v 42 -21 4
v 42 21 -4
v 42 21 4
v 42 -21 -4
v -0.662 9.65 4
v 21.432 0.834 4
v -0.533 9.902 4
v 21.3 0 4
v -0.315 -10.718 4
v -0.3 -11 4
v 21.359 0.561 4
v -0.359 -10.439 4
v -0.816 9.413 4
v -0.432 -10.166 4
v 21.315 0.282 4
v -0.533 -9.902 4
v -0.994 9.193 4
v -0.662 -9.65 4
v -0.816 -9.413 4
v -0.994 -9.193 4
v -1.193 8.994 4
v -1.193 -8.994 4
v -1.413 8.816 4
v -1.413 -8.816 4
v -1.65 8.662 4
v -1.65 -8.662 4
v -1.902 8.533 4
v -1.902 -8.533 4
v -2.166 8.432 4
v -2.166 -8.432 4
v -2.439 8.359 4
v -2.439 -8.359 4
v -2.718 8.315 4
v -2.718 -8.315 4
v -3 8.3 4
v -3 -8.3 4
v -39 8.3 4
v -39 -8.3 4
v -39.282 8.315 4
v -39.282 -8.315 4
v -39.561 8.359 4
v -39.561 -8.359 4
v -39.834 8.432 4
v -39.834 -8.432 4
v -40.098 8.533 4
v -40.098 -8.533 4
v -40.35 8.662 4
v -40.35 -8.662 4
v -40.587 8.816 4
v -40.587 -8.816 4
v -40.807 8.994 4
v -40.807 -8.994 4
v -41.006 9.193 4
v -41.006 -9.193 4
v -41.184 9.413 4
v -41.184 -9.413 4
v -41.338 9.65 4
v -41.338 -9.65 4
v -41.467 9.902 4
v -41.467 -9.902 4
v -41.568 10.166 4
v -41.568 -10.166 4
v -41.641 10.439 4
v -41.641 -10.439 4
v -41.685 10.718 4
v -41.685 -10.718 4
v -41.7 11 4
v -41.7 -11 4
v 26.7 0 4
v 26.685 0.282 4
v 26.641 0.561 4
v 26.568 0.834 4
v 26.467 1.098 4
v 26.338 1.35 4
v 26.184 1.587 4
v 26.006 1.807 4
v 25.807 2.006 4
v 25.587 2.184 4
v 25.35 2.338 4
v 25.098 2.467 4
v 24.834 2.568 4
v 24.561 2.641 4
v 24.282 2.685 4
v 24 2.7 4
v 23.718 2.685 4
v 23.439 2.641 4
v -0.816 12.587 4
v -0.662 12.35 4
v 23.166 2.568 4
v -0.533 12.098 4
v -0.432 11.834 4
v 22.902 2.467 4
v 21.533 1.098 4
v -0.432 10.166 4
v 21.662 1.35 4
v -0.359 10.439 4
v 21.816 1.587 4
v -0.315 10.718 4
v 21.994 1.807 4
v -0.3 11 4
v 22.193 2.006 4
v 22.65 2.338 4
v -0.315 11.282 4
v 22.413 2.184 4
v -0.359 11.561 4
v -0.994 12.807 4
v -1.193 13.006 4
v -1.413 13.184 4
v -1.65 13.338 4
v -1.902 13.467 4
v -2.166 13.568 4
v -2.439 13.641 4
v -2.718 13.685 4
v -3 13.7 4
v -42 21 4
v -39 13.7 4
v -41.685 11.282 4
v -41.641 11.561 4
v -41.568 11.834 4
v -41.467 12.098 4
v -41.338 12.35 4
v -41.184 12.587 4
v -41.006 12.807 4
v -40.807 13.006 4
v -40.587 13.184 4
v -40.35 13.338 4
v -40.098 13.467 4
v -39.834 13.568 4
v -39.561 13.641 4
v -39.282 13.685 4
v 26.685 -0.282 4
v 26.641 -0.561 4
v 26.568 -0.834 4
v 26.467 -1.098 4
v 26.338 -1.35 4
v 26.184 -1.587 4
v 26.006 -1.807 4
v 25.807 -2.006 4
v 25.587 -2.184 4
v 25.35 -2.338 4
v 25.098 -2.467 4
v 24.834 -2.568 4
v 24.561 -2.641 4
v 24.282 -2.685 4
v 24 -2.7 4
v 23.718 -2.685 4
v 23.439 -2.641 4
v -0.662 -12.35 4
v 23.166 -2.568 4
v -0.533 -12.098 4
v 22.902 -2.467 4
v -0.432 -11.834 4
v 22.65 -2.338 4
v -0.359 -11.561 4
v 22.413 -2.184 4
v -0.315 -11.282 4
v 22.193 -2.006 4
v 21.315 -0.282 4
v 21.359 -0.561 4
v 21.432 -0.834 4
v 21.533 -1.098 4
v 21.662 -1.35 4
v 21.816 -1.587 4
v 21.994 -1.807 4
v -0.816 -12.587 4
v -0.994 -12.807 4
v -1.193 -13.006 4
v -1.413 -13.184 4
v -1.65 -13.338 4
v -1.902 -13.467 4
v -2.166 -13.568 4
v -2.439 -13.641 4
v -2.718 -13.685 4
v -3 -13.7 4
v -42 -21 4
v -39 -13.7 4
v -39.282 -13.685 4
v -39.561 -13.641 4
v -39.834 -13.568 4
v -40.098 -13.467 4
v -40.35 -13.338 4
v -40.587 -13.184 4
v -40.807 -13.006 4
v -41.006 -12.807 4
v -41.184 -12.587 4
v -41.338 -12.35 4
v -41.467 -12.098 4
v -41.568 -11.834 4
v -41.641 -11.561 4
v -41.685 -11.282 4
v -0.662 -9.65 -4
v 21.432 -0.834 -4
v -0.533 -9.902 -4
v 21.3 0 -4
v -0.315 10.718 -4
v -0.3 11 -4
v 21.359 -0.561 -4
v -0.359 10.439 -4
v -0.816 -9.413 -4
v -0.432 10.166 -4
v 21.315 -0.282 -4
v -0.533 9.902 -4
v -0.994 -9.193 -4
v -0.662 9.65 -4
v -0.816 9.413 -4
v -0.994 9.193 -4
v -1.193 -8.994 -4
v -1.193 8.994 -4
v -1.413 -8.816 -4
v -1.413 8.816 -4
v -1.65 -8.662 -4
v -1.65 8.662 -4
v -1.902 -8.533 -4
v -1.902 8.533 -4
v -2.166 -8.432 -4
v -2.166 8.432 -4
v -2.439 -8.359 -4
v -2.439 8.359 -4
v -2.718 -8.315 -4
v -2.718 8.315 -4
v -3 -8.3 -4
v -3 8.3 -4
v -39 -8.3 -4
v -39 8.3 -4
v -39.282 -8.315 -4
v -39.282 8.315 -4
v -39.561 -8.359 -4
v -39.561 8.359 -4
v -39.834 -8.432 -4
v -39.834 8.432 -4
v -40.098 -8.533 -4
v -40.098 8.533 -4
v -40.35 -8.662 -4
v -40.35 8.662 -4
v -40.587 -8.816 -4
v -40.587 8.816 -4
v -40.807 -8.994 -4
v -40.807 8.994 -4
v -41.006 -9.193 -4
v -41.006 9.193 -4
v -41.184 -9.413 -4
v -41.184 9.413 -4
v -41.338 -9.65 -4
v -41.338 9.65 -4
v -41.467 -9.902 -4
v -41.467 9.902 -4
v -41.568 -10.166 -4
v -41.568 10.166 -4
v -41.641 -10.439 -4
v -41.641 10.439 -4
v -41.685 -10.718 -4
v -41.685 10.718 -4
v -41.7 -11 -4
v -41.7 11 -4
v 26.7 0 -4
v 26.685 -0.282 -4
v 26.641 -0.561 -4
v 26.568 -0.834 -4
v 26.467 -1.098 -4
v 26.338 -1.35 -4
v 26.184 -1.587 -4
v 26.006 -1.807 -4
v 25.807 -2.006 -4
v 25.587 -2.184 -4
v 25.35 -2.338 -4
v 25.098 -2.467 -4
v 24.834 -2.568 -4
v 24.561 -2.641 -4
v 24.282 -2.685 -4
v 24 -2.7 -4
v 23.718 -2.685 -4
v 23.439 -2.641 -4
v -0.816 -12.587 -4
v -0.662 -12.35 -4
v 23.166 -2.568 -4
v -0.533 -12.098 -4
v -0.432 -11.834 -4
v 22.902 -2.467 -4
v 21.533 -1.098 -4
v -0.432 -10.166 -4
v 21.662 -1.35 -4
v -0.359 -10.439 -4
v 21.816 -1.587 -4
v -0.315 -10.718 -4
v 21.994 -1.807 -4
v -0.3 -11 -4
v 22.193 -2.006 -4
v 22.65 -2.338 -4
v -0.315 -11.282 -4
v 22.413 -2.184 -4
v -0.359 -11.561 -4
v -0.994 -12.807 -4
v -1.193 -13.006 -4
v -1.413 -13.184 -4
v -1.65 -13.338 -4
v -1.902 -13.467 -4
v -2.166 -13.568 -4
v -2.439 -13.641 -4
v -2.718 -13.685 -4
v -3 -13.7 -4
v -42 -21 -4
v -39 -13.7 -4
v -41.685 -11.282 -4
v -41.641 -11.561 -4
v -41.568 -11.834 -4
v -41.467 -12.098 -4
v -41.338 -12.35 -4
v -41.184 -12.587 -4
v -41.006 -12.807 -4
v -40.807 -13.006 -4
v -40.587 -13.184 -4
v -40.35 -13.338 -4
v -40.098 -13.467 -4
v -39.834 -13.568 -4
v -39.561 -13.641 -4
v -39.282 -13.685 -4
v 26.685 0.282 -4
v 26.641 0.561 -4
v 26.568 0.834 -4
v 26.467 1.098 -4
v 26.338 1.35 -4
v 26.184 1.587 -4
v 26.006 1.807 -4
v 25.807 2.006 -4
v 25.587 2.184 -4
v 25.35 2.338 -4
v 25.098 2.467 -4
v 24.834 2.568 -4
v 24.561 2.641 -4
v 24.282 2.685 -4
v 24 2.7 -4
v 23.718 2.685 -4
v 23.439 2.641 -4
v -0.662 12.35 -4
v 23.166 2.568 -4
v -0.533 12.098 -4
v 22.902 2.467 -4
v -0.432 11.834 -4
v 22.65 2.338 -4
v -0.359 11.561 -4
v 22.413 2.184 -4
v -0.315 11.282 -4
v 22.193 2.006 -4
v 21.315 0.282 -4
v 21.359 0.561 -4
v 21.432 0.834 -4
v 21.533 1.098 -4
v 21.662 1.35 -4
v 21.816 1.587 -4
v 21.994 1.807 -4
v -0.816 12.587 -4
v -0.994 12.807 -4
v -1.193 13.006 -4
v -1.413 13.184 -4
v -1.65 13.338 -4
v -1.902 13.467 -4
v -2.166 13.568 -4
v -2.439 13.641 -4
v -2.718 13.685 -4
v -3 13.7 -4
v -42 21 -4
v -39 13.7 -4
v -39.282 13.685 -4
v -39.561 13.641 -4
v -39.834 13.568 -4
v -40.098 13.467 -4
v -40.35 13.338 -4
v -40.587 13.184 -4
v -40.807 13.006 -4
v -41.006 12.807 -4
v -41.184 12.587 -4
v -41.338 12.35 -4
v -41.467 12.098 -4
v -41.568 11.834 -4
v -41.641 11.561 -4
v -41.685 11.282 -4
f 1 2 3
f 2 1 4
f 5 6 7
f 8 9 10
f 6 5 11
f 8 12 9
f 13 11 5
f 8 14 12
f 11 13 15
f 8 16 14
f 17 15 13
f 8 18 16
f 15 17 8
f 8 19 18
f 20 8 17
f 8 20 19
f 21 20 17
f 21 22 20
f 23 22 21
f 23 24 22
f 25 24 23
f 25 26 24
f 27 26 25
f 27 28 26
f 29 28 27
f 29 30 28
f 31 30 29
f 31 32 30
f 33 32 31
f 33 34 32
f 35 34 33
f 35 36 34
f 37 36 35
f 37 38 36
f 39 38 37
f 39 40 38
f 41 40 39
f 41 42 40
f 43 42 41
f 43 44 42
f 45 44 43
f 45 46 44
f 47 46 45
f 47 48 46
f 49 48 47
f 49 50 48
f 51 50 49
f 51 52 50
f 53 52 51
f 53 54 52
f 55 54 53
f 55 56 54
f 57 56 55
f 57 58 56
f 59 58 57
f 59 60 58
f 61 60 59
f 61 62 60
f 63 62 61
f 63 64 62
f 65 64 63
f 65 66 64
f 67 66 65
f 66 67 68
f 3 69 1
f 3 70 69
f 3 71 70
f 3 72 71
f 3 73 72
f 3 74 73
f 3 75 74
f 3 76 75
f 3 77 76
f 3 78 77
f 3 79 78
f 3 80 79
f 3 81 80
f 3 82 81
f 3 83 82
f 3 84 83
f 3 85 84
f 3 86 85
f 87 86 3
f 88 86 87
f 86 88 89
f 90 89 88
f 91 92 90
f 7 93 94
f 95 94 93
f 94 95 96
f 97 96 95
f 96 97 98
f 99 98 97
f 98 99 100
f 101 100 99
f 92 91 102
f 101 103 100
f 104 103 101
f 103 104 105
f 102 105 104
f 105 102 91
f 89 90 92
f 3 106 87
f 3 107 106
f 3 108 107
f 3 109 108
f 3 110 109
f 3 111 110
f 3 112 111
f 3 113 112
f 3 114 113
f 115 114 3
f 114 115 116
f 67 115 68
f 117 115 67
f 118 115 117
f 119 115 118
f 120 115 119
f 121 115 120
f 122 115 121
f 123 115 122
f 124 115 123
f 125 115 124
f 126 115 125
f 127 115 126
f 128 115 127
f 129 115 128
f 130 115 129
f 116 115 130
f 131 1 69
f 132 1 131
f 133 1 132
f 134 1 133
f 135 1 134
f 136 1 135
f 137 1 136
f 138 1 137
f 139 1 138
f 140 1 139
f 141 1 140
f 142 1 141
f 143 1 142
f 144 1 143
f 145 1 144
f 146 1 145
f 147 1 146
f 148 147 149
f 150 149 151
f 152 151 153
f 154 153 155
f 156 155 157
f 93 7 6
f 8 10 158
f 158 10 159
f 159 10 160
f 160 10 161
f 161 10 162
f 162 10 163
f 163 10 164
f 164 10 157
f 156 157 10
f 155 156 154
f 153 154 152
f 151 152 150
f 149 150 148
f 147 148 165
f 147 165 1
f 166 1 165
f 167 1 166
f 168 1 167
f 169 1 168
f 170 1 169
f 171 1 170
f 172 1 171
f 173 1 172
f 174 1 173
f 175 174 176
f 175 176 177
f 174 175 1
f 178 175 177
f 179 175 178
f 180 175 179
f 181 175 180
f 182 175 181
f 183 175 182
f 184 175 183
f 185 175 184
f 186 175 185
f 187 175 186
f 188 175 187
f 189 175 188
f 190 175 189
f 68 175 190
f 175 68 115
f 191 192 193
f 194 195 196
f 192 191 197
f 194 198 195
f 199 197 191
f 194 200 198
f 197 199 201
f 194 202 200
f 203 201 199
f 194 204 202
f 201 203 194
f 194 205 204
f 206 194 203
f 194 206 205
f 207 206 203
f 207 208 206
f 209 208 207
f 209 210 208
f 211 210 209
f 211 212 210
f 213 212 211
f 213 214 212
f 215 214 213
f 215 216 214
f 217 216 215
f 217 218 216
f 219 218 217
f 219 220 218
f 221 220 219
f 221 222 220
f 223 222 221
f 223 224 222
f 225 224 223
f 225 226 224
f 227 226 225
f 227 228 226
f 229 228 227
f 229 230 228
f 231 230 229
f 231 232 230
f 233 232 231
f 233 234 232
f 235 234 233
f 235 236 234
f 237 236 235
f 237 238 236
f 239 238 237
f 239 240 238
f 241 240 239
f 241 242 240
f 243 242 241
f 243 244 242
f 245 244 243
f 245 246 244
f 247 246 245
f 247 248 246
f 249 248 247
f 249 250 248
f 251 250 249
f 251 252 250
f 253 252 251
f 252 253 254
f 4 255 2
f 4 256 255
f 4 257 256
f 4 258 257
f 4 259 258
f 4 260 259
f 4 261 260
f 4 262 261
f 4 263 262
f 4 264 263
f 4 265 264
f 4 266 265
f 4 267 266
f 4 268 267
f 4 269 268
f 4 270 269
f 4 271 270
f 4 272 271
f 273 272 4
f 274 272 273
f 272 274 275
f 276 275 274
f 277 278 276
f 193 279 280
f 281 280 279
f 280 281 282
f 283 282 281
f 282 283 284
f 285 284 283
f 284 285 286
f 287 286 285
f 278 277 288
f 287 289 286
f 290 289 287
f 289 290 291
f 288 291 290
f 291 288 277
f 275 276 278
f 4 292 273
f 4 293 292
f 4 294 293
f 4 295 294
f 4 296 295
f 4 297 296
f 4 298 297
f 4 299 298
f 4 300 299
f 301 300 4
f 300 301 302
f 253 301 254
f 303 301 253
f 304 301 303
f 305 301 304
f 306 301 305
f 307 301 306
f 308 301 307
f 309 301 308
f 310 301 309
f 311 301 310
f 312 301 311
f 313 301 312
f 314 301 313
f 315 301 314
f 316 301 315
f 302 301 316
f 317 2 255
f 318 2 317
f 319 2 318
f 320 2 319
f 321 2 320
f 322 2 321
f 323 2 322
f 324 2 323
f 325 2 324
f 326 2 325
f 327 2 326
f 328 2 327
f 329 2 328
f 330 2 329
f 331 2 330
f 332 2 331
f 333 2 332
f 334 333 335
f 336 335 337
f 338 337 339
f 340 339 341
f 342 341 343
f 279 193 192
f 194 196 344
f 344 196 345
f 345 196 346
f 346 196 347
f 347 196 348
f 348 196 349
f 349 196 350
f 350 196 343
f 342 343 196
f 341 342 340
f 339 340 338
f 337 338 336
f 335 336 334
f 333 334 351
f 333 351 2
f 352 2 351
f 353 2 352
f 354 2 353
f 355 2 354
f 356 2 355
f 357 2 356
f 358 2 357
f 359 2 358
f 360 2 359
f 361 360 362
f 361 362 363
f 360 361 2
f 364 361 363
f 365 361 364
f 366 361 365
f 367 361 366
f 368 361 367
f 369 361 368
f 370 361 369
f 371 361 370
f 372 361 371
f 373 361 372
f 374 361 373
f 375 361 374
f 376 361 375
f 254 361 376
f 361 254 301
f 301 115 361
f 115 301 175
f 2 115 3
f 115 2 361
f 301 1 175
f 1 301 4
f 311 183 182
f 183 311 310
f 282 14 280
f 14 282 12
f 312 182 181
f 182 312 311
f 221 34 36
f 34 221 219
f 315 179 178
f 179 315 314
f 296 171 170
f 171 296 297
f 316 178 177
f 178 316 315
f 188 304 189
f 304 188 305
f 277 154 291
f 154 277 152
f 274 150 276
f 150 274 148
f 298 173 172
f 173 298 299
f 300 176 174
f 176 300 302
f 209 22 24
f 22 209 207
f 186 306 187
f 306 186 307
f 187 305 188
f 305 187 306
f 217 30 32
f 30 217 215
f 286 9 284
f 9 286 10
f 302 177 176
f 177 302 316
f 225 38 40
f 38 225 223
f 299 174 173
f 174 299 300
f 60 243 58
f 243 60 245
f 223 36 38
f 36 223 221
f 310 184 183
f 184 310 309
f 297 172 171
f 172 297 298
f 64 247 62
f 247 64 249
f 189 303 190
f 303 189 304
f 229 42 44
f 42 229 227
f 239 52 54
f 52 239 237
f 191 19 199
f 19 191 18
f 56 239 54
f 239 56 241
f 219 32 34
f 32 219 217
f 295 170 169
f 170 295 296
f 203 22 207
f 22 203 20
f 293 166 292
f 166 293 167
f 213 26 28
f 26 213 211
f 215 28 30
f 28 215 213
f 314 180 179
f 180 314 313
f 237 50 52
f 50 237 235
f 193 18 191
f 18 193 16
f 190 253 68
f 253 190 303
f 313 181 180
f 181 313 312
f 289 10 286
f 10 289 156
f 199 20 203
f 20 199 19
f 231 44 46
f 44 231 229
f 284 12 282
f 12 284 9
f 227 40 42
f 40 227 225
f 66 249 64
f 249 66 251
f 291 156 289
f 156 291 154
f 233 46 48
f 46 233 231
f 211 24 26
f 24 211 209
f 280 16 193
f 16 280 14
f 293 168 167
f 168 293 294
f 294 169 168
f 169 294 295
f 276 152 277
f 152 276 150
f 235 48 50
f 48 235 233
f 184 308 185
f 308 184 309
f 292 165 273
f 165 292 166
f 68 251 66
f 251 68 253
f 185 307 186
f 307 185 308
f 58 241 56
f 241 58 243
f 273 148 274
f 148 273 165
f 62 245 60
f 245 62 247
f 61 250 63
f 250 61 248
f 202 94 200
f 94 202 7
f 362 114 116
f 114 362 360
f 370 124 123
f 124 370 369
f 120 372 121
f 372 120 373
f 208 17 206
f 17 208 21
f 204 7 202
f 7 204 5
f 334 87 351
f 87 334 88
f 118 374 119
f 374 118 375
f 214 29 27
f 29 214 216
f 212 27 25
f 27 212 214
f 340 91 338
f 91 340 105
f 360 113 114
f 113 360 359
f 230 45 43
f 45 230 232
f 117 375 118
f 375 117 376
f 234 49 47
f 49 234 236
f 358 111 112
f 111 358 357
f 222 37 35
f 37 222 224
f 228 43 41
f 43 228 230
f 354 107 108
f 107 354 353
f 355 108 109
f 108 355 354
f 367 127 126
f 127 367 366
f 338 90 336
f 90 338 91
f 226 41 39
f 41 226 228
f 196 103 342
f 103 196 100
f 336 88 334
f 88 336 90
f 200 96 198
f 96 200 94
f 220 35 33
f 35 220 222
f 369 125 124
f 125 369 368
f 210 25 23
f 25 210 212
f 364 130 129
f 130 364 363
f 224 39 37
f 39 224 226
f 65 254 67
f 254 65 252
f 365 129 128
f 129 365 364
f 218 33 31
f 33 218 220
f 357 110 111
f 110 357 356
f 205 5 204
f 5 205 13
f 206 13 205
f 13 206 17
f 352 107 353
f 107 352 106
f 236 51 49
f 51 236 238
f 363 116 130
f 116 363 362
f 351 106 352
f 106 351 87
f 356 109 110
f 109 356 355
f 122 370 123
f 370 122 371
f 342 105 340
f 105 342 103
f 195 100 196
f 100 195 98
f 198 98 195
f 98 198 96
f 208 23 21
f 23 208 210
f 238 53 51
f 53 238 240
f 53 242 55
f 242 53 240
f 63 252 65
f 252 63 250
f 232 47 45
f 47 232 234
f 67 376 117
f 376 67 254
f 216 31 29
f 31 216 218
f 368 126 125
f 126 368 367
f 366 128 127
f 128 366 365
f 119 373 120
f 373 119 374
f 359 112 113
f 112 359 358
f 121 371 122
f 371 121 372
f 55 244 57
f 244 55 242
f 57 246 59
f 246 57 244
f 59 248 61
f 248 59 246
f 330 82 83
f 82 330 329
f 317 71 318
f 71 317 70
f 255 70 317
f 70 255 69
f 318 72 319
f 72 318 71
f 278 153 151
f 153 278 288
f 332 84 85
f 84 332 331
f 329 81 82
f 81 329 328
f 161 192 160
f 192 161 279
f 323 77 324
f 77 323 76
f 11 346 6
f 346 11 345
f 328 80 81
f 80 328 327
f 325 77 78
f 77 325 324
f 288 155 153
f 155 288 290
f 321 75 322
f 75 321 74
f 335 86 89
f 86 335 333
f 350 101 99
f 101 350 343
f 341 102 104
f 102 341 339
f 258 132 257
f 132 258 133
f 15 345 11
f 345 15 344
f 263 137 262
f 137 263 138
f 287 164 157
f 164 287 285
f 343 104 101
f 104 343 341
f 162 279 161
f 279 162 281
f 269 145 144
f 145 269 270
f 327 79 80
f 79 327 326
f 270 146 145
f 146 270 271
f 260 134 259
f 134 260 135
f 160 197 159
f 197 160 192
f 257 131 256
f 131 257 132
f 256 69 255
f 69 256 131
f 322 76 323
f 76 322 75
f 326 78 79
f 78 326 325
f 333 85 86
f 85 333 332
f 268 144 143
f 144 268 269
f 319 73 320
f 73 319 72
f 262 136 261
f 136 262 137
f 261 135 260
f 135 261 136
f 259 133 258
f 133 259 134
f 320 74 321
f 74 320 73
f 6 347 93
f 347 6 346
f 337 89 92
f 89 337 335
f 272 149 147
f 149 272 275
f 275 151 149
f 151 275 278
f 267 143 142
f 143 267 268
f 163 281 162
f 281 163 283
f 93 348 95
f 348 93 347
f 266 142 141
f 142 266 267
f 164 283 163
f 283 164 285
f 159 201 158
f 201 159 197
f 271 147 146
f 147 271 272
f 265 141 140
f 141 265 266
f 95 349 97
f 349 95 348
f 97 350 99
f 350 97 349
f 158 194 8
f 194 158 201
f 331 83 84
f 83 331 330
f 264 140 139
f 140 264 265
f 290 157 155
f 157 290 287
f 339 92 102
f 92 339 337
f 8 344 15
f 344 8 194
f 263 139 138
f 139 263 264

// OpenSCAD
// GT2 idler tensioner slide for 6 mm belt.
$fn = 60;
eps = 0.02;
slide_l = 84;
slide_w = 42;
slide_t = 8;
belt_w = 6;
slot_l = 36;
axle_d = 5.4;
axle_x = slide_l / 2 - 18;
module slot(y) {
    hull() {
        translate([-slide_l / 4 - slot_l / 2, y, -slide_t / 2 - eps]) cylinder(d = 5.4, h = slide_t + 2 * eps);
        translate([-slide_l / 4 + slot_l / 2, y, -slide_t / 2 - eps]) cylinder(d = 5.4, h = slide_t + 2 * eps);
    }
}
difference() {
    cube([slide_l, slide_w, slide_t], center = true);
    slot(-11);
    slot(11);
    translate([axle_x, 0, -slide_t / 2 - eps]) cylinder(d = axle_d, h = slide_t + 2 * eps);
}
